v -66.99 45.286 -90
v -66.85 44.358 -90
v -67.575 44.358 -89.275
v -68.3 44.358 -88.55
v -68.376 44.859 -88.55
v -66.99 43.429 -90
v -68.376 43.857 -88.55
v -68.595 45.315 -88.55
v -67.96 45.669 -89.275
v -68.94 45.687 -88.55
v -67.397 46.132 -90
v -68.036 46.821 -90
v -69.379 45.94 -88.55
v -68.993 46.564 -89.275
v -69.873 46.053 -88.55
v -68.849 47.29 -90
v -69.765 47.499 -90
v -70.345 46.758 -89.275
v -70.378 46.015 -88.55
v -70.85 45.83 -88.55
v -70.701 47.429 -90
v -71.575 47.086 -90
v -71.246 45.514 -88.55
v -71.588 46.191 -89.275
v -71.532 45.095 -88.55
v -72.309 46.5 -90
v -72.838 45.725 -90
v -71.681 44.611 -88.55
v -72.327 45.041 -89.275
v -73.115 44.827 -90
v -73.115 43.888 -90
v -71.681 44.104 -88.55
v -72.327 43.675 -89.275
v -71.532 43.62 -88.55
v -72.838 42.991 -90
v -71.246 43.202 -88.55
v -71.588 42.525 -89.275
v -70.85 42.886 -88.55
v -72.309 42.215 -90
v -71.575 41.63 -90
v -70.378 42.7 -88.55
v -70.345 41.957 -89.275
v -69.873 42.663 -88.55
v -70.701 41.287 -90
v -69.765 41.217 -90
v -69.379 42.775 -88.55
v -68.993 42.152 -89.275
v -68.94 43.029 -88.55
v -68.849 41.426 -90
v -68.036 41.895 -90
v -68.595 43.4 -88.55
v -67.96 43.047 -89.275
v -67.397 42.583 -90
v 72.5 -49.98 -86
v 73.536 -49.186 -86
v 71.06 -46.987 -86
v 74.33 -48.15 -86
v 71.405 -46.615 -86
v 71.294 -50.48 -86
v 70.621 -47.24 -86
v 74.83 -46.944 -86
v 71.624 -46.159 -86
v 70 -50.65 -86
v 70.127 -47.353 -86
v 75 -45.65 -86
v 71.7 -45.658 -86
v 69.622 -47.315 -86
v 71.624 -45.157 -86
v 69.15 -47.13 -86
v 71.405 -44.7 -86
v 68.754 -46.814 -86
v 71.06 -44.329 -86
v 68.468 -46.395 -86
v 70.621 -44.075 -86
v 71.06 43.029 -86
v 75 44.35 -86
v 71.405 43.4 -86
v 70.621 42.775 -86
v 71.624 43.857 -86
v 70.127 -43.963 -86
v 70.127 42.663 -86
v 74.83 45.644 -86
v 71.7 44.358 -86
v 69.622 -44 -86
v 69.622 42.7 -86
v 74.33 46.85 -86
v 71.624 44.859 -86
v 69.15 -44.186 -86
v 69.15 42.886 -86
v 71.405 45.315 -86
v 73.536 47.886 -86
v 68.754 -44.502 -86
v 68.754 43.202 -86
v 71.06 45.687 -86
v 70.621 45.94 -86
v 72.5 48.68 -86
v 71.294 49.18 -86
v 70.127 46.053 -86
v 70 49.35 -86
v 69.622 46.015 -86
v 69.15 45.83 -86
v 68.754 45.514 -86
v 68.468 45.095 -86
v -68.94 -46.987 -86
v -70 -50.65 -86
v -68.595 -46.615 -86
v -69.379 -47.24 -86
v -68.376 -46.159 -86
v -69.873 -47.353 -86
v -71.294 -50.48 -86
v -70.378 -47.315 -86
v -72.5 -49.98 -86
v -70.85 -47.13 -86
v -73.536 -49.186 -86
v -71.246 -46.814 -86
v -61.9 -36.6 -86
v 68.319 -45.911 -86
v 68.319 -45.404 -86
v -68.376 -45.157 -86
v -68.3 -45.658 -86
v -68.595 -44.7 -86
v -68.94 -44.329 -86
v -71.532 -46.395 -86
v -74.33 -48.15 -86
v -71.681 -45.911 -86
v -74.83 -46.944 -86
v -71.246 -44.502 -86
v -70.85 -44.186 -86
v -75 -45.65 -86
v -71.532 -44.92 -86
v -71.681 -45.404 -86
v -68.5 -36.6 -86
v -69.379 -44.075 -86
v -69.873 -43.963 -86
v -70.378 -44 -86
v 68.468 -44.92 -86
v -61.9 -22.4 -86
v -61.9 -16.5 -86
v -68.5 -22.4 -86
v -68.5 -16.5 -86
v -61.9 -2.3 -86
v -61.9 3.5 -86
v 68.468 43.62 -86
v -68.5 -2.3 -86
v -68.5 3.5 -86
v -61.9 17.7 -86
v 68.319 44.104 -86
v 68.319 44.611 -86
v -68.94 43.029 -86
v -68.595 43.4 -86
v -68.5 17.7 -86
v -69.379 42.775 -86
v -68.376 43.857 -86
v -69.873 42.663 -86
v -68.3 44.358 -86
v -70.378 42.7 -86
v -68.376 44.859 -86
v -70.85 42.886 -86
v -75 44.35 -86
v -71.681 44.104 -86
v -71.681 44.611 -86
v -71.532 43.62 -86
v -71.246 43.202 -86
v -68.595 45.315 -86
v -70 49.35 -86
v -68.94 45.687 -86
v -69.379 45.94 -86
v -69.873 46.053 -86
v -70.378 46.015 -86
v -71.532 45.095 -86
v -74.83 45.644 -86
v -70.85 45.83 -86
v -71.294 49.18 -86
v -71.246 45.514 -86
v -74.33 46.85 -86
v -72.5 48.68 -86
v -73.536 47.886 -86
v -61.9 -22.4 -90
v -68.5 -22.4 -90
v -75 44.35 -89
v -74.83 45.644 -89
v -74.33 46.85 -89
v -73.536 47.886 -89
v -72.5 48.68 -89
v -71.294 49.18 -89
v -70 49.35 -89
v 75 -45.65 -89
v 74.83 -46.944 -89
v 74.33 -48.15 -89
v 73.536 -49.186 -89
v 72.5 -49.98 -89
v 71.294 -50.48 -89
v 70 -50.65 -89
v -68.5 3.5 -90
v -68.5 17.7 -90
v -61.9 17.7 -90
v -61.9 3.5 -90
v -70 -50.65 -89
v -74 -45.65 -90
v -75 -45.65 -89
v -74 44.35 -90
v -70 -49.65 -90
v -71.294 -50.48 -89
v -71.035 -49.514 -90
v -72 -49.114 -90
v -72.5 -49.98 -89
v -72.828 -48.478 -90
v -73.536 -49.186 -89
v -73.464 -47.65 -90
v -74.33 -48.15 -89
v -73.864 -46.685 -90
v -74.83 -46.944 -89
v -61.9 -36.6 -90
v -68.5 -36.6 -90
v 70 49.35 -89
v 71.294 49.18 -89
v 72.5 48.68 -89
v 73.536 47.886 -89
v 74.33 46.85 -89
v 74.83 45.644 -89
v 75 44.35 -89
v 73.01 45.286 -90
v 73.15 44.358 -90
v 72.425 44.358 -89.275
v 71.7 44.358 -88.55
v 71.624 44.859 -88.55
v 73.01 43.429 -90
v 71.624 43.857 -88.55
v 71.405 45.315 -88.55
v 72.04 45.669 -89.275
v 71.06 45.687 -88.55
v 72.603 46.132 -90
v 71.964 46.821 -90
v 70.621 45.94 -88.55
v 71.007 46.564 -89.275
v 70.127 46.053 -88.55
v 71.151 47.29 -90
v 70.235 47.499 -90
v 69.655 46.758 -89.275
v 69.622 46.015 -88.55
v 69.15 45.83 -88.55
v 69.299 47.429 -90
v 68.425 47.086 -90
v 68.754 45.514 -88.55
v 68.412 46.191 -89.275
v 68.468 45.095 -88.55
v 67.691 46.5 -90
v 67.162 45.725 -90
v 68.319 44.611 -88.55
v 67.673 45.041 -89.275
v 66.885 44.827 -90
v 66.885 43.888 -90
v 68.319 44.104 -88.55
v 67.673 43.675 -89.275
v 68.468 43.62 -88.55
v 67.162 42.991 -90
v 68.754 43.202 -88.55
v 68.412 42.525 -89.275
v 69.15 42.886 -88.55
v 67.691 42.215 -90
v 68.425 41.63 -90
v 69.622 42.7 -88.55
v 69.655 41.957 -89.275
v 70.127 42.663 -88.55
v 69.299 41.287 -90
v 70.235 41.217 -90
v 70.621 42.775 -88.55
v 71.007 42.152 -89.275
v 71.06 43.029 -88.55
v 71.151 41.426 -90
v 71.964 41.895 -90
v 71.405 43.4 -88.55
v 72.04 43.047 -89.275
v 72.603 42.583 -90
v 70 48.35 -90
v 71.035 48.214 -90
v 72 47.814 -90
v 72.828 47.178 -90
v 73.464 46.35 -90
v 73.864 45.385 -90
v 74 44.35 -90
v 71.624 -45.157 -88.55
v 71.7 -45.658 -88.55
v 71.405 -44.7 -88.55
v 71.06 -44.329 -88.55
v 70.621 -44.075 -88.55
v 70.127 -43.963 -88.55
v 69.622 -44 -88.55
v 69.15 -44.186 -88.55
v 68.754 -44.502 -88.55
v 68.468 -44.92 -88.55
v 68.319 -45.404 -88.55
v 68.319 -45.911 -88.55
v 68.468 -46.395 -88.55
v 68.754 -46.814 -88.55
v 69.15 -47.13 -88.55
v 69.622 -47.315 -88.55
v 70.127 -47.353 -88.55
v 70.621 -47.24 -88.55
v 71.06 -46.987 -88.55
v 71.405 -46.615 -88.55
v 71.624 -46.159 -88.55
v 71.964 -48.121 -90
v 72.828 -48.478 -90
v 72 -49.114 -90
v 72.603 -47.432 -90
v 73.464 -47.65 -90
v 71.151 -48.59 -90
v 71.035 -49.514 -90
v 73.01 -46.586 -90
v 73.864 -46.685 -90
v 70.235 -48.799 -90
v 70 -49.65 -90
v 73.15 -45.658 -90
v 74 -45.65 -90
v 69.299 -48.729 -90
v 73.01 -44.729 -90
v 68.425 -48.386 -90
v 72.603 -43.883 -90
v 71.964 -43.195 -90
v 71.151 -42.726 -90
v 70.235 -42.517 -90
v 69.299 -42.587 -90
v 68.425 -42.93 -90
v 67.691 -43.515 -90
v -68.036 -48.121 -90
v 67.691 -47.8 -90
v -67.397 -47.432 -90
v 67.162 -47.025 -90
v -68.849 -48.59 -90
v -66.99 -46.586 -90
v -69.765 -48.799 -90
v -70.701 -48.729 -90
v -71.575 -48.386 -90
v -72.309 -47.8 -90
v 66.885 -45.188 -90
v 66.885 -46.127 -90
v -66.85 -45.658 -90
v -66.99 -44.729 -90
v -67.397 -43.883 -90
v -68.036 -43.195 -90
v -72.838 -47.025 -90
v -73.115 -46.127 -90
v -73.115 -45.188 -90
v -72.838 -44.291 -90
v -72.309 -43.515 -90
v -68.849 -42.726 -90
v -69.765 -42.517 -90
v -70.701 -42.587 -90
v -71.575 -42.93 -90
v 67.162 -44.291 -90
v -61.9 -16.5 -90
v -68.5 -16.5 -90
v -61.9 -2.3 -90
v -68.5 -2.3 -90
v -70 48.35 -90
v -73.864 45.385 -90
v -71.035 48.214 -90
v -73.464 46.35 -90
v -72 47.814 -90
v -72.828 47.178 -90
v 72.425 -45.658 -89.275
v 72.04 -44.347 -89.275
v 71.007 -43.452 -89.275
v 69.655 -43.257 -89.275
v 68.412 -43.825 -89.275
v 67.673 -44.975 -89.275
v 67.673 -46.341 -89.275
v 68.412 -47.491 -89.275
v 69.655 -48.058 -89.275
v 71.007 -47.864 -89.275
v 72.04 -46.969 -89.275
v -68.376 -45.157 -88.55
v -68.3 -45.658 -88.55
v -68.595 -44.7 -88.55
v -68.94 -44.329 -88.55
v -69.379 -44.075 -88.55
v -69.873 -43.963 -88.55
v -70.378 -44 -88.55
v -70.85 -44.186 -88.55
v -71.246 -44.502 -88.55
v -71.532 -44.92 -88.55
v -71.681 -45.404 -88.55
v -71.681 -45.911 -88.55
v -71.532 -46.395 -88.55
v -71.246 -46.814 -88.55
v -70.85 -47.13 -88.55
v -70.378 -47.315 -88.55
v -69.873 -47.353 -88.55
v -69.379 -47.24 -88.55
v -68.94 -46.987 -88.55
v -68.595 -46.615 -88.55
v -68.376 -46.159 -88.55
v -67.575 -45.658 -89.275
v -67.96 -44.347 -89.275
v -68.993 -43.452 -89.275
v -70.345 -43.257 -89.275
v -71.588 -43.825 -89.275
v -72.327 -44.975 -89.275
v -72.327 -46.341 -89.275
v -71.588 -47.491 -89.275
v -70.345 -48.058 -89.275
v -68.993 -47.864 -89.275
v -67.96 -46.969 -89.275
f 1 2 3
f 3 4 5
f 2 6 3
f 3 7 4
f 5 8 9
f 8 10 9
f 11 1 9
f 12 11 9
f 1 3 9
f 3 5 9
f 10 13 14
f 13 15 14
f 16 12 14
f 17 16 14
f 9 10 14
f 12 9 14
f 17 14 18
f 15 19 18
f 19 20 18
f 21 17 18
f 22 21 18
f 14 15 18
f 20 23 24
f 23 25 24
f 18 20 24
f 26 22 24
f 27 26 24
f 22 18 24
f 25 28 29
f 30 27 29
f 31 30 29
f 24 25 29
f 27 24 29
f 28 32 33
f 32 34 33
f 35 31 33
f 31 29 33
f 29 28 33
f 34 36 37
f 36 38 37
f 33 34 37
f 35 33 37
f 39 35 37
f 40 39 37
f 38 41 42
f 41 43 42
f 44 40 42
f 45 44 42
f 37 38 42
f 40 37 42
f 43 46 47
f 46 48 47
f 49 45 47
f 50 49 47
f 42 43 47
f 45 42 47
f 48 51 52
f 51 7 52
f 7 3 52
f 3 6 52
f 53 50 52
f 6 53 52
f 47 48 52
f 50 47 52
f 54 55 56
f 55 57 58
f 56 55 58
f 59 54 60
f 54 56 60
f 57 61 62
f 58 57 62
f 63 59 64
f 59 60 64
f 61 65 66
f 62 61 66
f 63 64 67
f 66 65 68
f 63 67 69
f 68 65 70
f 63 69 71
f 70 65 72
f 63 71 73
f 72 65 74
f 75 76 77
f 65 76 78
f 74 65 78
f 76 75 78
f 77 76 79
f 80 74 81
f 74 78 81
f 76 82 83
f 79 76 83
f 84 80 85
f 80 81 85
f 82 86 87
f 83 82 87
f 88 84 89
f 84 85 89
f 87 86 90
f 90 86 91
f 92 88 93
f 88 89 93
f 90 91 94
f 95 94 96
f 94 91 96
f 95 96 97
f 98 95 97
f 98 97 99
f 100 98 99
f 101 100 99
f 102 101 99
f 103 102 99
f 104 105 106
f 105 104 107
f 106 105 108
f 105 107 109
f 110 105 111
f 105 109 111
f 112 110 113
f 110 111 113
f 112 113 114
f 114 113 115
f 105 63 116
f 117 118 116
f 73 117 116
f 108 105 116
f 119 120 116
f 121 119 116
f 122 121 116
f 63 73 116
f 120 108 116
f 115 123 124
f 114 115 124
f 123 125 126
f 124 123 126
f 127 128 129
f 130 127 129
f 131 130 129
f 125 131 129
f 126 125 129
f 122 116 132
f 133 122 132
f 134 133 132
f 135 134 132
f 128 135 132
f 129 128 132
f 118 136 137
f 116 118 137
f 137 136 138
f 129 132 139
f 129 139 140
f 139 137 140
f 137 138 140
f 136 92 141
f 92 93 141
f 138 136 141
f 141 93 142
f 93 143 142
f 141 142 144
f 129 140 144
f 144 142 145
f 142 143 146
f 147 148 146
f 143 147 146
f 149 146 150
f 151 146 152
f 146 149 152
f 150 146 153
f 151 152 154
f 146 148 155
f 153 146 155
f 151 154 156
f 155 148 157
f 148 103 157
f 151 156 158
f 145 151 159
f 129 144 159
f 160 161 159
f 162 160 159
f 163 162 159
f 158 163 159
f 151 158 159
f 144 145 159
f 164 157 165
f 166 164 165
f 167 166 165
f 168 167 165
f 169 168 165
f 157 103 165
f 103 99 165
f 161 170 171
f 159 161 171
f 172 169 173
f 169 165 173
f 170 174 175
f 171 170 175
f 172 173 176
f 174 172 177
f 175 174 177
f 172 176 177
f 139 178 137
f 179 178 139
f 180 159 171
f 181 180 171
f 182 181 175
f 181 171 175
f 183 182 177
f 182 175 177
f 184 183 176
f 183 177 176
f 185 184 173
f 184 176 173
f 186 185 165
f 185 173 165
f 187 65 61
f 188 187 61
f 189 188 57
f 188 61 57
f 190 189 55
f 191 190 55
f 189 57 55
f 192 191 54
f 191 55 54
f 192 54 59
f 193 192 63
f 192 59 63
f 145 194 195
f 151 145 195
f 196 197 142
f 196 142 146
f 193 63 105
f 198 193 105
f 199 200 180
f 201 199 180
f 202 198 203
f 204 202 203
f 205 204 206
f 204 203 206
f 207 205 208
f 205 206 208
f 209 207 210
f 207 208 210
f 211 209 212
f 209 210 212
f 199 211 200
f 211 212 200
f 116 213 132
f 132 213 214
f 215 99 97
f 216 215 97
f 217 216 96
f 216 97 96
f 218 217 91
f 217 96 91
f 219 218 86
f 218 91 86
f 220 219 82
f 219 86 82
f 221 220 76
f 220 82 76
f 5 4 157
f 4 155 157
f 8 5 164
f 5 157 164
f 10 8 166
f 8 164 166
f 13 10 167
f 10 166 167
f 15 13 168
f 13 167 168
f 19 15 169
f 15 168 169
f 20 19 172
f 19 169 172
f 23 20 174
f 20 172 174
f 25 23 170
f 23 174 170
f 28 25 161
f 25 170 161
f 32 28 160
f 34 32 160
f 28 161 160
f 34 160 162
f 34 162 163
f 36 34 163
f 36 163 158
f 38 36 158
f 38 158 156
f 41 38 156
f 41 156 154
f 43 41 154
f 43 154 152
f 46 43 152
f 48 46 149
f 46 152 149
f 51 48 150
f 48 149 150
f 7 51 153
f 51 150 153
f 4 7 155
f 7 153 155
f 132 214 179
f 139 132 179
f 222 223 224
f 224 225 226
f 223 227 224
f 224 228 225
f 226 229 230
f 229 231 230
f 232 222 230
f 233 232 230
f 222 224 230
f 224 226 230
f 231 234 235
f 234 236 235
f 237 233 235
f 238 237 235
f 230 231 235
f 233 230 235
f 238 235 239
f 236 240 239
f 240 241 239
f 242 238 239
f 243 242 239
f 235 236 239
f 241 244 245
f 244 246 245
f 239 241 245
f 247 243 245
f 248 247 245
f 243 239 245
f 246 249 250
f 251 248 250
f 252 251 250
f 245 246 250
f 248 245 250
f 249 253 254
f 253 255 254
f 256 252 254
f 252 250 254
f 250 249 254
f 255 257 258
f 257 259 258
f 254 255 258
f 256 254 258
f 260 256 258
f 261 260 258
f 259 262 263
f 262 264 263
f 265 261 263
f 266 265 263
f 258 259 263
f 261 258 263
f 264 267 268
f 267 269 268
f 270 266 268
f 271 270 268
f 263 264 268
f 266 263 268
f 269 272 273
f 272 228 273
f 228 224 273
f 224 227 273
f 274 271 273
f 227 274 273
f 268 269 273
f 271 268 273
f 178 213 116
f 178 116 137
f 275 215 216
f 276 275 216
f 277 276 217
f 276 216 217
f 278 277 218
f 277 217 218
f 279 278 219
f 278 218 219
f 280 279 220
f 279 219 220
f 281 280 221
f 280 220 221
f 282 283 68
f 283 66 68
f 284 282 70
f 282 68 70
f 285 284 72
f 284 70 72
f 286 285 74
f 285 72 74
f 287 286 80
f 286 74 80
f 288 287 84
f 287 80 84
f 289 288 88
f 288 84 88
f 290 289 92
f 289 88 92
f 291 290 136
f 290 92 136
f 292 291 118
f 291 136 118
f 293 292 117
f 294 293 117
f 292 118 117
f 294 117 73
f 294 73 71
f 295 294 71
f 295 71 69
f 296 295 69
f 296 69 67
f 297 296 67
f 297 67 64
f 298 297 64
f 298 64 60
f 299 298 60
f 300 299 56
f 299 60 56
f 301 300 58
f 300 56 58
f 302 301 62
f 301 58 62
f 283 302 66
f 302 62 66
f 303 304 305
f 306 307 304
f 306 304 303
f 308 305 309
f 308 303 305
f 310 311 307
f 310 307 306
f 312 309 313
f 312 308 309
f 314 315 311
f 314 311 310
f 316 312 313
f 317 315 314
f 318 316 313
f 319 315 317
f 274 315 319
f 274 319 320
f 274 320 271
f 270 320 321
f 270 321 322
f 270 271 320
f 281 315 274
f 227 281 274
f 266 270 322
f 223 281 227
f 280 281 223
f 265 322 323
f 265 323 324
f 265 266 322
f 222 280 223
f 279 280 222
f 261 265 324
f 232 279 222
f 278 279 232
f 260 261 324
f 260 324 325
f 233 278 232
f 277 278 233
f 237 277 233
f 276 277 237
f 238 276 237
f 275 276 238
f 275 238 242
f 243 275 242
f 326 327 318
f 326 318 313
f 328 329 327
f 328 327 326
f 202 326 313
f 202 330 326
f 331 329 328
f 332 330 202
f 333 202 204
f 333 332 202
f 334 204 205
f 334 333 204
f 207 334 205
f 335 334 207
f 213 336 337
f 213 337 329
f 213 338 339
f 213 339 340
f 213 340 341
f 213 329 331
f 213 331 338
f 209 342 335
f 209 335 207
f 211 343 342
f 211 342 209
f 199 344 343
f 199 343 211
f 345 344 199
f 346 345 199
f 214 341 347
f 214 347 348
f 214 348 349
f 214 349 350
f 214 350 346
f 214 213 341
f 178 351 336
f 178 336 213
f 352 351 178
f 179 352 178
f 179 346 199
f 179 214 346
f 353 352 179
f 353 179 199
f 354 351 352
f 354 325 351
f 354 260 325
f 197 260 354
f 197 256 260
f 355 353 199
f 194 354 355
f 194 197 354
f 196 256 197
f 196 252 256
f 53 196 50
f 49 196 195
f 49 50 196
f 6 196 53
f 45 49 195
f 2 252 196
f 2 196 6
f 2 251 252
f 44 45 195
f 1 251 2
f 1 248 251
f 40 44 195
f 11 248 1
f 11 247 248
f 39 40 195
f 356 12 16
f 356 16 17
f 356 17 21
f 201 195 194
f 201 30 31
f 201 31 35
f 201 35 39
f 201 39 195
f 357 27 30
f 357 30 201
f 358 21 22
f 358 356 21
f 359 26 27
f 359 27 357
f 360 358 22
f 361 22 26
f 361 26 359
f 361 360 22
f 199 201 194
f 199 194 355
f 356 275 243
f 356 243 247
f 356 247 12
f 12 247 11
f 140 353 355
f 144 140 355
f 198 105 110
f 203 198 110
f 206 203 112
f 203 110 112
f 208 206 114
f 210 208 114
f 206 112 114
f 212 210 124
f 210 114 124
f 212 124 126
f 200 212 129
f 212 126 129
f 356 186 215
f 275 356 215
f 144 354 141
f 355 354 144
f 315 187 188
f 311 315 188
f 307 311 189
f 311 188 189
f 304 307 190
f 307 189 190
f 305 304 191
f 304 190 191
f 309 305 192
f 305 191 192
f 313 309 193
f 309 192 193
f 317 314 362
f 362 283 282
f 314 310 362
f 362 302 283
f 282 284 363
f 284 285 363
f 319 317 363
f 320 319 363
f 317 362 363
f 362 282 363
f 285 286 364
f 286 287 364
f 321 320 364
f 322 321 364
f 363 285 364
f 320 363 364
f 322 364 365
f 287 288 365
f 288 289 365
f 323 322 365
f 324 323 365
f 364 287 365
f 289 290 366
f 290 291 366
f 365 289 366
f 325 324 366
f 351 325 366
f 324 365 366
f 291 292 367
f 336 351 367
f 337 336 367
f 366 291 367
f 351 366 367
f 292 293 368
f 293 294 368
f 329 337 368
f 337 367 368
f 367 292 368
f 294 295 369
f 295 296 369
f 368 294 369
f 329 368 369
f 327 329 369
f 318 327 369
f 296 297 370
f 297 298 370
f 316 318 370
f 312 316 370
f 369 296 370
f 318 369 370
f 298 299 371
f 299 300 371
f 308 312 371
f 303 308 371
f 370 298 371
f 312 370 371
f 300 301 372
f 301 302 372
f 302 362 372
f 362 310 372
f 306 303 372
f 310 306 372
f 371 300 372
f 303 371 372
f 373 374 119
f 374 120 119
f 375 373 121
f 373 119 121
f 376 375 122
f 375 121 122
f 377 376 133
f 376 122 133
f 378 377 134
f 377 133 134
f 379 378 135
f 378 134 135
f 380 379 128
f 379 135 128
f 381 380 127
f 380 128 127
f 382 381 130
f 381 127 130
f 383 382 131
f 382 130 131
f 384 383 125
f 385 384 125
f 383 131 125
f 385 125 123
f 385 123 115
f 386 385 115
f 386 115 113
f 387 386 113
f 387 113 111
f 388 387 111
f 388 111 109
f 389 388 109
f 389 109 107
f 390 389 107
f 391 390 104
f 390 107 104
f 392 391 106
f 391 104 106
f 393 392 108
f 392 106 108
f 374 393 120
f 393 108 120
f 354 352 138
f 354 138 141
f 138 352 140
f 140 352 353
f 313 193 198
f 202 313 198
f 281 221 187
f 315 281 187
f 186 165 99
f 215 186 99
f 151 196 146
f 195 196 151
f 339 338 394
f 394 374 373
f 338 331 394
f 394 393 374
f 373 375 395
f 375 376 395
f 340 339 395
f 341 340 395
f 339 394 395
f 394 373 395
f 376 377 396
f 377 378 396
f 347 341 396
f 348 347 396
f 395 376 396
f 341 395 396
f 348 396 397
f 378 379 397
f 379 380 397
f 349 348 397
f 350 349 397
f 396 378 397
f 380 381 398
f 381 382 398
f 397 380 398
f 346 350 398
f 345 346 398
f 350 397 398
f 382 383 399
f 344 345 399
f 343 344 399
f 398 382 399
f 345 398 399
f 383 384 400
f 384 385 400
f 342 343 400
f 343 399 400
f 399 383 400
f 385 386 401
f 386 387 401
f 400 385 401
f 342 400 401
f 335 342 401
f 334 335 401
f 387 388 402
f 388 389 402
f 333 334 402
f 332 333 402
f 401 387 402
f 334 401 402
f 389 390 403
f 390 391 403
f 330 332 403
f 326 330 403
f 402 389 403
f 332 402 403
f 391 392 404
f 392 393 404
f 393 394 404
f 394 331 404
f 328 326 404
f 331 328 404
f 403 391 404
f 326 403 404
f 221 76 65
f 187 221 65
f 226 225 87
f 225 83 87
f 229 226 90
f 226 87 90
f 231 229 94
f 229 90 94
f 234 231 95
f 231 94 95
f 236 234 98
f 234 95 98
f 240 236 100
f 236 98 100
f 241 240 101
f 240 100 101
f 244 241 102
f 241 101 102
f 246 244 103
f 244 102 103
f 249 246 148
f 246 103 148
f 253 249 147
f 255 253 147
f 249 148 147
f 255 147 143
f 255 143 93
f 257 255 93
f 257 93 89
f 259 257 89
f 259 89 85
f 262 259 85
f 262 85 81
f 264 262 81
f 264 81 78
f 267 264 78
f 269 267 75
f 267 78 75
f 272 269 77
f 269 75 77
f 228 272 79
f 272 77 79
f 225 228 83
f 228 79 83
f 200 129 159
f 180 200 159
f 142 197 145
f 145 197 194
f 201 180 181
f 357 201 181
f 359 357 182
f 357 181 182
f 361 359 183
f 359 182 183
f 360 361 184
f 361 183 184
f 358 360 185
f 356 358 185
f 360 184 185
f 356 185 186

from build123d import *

# Parameters (mm, degrees)
P_IDAT_VYSUNUT_M1_DEPTH                           = 4
KU_ELOV_ZAHLOUBEN_PRO_M3_ROUBU_SE_Z_P_D           = 3.4
KU_ELOV_ZAHLOUBEN_PRO_M3_ROUBU_SE_Z_P_CSINK_D     = 6.3
KU_ELOV_ZAHLOUBEN_PRO_M3_ROUBU_SE_Z_P_CSINK_ANGLE = 90
ZKOSEN_1_SIZE                                     = 1
SKICA4_W                                          = 6.6
SKICA4_H                                          = 14.2
ODEBRAT_VYSUNUT_M1_DEPTH                          = 91.589306764


with BuildPart() as part:
    # Skica1 → Přidat vysunutím1 (new body)
    with BuildSketch(Plane(origin=(0, 0, -86), x_dir=(-1, 0, 0), z_dir=(0, 0, -1))):
        with BuildLine():
            Line((-75, 44.35), (-75, -45.65))
            ThreePointArc((-75, -45.65), (-73.535533906, -49.185533906), (-70, -50.65))
            Line((-70, -50.65), (70, -50.65))
            ThreePointArc((70, -50.65), (73.535533906, -49.185533906), (75, -45.65))
            Line((75, -45.65), (75, 44.35))
            ThreePointArc((75, 44.35), (73.535533906, 47.885533906), (70, 49.35))
            Line((70, 49.35), (-70, 49.35))
            ThreePointArc((-70, 49.35), (-73.535533906, 47.885533906), (-75, 44.35))
        make_face()
    extrude(amount=P_IDAT_VYSUNUT_M1_DEPTH)

    # Kuželové zahloubení pro M3 šroubu se zápustnou hlavou plochou1 (through all)
    with Locations(Plane(origin=(0, 0, -90), x_dir=(-1, 0, 0), z_dir=(0, 0, -1))):
        with Locations((70, -45.657811951), (70, 44.357811951), (-70, 44.357811951), (-70, -45.657811951)):
            CounterSinkHole(KU_ELOV_ZAHLOUBEN_PRO_M3_ROUBU_SE_Z_P_D / 2, KU_ELOV_ZAHLOUBEN_PRO_M3_ROUBU_SE_Z_P_CSINK_D / 2, counter_sink_angle=KU_ELOV_ZAHLOUBEN_PRO_M3_ROUBU_SE_Z_P_CSINK_ANGLE)

    # Zkosení1
    zkosen_1_edges = [part.edges().sort_by_distance(p)[0] for p in [
        (73.535533906, -49.185533906, -90),
        (0, -50.65, -90),
        (-73.535533906, -49.185533906, -90),
        (-75, -0.65, -90),
        (-73.535533906, 47.885533906, -90),
        (0, 49.35, -90),
        (73.535533906, 47.885533906, -90),
        (75, -0.65, -90),
    ]]
    chamfer(zkosen_1_edges, length=ZKOSEN_1_SIZE)

    # Skica4 → Odebrat vysunutím1 (cut, through all)
    with BuildSketch(Plane(origin=(0, 0, -90), x_dir=(-1, 0, 0), z_dir=(0, 0, -1))):
        with Locations((65.2, -29.5)):
            Rectangle(SKICA4_W, SKICA4_H)
        with Locations((65.2, -9.4)):
            Rectangle(SKICA4_W, SKICA4_H)
        with Locations((65.2, 10.6)):
            Rectangle(SKICA4_W, SKICA4_H)
    extrude(amount=-ODEBRAT_VYSUNUT_M1_DEPTH, mode=Mode.SUBTRACT)


solid = part.part
